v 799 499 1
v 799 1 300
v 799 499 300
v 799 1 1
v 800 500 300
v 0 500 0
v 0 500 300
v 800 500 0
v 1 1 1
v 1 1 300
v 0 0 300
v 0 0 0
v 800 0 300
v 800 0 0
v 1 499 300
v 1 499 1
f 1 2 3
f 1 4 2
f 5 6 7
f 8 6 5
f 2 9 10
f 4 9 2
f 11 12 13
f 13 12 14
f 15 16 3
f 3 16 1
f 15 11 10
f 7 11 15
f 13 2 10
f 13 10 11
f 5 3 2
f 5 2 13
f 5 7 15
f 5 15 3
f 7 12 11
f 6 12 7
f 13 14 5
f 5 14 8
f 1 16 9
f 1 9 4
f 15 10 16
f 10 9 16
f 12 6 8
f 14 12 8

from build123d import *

# Parameters (mm, degrees)
F0_W     = 800
F0_H     = 500
F1_DEPTH = 300
F2_T     = -1
F4_DEPTH = 798


with BuildPart() as f1:
    # F0 (on Top) → F1 (new body)
    with BuildSketch(Plane.XY):
        with Locations((400, 250)):
            Rectangle(F0_W, F0_H)
    extrude(amount=F1_DEPTH)

    # F2
    f2_openings = [f1.faces().sort_by_distance(p)[0] for p in [
        (400, 250, 300),
    ]]
    offset(amount=F2_T, openings=f2_openings)


with BuildPart() as f4:
    # F3 (on Right) → F4 (new body)
    with BuildSketch(Plane.YZ):
        Polygon((-25, 0), (0, 0), (0, 2), (-23, 2), (-23, 25), (-25, 25), align=None)
    extrude(amount=F4_DEPTH)


solid = f1.part
